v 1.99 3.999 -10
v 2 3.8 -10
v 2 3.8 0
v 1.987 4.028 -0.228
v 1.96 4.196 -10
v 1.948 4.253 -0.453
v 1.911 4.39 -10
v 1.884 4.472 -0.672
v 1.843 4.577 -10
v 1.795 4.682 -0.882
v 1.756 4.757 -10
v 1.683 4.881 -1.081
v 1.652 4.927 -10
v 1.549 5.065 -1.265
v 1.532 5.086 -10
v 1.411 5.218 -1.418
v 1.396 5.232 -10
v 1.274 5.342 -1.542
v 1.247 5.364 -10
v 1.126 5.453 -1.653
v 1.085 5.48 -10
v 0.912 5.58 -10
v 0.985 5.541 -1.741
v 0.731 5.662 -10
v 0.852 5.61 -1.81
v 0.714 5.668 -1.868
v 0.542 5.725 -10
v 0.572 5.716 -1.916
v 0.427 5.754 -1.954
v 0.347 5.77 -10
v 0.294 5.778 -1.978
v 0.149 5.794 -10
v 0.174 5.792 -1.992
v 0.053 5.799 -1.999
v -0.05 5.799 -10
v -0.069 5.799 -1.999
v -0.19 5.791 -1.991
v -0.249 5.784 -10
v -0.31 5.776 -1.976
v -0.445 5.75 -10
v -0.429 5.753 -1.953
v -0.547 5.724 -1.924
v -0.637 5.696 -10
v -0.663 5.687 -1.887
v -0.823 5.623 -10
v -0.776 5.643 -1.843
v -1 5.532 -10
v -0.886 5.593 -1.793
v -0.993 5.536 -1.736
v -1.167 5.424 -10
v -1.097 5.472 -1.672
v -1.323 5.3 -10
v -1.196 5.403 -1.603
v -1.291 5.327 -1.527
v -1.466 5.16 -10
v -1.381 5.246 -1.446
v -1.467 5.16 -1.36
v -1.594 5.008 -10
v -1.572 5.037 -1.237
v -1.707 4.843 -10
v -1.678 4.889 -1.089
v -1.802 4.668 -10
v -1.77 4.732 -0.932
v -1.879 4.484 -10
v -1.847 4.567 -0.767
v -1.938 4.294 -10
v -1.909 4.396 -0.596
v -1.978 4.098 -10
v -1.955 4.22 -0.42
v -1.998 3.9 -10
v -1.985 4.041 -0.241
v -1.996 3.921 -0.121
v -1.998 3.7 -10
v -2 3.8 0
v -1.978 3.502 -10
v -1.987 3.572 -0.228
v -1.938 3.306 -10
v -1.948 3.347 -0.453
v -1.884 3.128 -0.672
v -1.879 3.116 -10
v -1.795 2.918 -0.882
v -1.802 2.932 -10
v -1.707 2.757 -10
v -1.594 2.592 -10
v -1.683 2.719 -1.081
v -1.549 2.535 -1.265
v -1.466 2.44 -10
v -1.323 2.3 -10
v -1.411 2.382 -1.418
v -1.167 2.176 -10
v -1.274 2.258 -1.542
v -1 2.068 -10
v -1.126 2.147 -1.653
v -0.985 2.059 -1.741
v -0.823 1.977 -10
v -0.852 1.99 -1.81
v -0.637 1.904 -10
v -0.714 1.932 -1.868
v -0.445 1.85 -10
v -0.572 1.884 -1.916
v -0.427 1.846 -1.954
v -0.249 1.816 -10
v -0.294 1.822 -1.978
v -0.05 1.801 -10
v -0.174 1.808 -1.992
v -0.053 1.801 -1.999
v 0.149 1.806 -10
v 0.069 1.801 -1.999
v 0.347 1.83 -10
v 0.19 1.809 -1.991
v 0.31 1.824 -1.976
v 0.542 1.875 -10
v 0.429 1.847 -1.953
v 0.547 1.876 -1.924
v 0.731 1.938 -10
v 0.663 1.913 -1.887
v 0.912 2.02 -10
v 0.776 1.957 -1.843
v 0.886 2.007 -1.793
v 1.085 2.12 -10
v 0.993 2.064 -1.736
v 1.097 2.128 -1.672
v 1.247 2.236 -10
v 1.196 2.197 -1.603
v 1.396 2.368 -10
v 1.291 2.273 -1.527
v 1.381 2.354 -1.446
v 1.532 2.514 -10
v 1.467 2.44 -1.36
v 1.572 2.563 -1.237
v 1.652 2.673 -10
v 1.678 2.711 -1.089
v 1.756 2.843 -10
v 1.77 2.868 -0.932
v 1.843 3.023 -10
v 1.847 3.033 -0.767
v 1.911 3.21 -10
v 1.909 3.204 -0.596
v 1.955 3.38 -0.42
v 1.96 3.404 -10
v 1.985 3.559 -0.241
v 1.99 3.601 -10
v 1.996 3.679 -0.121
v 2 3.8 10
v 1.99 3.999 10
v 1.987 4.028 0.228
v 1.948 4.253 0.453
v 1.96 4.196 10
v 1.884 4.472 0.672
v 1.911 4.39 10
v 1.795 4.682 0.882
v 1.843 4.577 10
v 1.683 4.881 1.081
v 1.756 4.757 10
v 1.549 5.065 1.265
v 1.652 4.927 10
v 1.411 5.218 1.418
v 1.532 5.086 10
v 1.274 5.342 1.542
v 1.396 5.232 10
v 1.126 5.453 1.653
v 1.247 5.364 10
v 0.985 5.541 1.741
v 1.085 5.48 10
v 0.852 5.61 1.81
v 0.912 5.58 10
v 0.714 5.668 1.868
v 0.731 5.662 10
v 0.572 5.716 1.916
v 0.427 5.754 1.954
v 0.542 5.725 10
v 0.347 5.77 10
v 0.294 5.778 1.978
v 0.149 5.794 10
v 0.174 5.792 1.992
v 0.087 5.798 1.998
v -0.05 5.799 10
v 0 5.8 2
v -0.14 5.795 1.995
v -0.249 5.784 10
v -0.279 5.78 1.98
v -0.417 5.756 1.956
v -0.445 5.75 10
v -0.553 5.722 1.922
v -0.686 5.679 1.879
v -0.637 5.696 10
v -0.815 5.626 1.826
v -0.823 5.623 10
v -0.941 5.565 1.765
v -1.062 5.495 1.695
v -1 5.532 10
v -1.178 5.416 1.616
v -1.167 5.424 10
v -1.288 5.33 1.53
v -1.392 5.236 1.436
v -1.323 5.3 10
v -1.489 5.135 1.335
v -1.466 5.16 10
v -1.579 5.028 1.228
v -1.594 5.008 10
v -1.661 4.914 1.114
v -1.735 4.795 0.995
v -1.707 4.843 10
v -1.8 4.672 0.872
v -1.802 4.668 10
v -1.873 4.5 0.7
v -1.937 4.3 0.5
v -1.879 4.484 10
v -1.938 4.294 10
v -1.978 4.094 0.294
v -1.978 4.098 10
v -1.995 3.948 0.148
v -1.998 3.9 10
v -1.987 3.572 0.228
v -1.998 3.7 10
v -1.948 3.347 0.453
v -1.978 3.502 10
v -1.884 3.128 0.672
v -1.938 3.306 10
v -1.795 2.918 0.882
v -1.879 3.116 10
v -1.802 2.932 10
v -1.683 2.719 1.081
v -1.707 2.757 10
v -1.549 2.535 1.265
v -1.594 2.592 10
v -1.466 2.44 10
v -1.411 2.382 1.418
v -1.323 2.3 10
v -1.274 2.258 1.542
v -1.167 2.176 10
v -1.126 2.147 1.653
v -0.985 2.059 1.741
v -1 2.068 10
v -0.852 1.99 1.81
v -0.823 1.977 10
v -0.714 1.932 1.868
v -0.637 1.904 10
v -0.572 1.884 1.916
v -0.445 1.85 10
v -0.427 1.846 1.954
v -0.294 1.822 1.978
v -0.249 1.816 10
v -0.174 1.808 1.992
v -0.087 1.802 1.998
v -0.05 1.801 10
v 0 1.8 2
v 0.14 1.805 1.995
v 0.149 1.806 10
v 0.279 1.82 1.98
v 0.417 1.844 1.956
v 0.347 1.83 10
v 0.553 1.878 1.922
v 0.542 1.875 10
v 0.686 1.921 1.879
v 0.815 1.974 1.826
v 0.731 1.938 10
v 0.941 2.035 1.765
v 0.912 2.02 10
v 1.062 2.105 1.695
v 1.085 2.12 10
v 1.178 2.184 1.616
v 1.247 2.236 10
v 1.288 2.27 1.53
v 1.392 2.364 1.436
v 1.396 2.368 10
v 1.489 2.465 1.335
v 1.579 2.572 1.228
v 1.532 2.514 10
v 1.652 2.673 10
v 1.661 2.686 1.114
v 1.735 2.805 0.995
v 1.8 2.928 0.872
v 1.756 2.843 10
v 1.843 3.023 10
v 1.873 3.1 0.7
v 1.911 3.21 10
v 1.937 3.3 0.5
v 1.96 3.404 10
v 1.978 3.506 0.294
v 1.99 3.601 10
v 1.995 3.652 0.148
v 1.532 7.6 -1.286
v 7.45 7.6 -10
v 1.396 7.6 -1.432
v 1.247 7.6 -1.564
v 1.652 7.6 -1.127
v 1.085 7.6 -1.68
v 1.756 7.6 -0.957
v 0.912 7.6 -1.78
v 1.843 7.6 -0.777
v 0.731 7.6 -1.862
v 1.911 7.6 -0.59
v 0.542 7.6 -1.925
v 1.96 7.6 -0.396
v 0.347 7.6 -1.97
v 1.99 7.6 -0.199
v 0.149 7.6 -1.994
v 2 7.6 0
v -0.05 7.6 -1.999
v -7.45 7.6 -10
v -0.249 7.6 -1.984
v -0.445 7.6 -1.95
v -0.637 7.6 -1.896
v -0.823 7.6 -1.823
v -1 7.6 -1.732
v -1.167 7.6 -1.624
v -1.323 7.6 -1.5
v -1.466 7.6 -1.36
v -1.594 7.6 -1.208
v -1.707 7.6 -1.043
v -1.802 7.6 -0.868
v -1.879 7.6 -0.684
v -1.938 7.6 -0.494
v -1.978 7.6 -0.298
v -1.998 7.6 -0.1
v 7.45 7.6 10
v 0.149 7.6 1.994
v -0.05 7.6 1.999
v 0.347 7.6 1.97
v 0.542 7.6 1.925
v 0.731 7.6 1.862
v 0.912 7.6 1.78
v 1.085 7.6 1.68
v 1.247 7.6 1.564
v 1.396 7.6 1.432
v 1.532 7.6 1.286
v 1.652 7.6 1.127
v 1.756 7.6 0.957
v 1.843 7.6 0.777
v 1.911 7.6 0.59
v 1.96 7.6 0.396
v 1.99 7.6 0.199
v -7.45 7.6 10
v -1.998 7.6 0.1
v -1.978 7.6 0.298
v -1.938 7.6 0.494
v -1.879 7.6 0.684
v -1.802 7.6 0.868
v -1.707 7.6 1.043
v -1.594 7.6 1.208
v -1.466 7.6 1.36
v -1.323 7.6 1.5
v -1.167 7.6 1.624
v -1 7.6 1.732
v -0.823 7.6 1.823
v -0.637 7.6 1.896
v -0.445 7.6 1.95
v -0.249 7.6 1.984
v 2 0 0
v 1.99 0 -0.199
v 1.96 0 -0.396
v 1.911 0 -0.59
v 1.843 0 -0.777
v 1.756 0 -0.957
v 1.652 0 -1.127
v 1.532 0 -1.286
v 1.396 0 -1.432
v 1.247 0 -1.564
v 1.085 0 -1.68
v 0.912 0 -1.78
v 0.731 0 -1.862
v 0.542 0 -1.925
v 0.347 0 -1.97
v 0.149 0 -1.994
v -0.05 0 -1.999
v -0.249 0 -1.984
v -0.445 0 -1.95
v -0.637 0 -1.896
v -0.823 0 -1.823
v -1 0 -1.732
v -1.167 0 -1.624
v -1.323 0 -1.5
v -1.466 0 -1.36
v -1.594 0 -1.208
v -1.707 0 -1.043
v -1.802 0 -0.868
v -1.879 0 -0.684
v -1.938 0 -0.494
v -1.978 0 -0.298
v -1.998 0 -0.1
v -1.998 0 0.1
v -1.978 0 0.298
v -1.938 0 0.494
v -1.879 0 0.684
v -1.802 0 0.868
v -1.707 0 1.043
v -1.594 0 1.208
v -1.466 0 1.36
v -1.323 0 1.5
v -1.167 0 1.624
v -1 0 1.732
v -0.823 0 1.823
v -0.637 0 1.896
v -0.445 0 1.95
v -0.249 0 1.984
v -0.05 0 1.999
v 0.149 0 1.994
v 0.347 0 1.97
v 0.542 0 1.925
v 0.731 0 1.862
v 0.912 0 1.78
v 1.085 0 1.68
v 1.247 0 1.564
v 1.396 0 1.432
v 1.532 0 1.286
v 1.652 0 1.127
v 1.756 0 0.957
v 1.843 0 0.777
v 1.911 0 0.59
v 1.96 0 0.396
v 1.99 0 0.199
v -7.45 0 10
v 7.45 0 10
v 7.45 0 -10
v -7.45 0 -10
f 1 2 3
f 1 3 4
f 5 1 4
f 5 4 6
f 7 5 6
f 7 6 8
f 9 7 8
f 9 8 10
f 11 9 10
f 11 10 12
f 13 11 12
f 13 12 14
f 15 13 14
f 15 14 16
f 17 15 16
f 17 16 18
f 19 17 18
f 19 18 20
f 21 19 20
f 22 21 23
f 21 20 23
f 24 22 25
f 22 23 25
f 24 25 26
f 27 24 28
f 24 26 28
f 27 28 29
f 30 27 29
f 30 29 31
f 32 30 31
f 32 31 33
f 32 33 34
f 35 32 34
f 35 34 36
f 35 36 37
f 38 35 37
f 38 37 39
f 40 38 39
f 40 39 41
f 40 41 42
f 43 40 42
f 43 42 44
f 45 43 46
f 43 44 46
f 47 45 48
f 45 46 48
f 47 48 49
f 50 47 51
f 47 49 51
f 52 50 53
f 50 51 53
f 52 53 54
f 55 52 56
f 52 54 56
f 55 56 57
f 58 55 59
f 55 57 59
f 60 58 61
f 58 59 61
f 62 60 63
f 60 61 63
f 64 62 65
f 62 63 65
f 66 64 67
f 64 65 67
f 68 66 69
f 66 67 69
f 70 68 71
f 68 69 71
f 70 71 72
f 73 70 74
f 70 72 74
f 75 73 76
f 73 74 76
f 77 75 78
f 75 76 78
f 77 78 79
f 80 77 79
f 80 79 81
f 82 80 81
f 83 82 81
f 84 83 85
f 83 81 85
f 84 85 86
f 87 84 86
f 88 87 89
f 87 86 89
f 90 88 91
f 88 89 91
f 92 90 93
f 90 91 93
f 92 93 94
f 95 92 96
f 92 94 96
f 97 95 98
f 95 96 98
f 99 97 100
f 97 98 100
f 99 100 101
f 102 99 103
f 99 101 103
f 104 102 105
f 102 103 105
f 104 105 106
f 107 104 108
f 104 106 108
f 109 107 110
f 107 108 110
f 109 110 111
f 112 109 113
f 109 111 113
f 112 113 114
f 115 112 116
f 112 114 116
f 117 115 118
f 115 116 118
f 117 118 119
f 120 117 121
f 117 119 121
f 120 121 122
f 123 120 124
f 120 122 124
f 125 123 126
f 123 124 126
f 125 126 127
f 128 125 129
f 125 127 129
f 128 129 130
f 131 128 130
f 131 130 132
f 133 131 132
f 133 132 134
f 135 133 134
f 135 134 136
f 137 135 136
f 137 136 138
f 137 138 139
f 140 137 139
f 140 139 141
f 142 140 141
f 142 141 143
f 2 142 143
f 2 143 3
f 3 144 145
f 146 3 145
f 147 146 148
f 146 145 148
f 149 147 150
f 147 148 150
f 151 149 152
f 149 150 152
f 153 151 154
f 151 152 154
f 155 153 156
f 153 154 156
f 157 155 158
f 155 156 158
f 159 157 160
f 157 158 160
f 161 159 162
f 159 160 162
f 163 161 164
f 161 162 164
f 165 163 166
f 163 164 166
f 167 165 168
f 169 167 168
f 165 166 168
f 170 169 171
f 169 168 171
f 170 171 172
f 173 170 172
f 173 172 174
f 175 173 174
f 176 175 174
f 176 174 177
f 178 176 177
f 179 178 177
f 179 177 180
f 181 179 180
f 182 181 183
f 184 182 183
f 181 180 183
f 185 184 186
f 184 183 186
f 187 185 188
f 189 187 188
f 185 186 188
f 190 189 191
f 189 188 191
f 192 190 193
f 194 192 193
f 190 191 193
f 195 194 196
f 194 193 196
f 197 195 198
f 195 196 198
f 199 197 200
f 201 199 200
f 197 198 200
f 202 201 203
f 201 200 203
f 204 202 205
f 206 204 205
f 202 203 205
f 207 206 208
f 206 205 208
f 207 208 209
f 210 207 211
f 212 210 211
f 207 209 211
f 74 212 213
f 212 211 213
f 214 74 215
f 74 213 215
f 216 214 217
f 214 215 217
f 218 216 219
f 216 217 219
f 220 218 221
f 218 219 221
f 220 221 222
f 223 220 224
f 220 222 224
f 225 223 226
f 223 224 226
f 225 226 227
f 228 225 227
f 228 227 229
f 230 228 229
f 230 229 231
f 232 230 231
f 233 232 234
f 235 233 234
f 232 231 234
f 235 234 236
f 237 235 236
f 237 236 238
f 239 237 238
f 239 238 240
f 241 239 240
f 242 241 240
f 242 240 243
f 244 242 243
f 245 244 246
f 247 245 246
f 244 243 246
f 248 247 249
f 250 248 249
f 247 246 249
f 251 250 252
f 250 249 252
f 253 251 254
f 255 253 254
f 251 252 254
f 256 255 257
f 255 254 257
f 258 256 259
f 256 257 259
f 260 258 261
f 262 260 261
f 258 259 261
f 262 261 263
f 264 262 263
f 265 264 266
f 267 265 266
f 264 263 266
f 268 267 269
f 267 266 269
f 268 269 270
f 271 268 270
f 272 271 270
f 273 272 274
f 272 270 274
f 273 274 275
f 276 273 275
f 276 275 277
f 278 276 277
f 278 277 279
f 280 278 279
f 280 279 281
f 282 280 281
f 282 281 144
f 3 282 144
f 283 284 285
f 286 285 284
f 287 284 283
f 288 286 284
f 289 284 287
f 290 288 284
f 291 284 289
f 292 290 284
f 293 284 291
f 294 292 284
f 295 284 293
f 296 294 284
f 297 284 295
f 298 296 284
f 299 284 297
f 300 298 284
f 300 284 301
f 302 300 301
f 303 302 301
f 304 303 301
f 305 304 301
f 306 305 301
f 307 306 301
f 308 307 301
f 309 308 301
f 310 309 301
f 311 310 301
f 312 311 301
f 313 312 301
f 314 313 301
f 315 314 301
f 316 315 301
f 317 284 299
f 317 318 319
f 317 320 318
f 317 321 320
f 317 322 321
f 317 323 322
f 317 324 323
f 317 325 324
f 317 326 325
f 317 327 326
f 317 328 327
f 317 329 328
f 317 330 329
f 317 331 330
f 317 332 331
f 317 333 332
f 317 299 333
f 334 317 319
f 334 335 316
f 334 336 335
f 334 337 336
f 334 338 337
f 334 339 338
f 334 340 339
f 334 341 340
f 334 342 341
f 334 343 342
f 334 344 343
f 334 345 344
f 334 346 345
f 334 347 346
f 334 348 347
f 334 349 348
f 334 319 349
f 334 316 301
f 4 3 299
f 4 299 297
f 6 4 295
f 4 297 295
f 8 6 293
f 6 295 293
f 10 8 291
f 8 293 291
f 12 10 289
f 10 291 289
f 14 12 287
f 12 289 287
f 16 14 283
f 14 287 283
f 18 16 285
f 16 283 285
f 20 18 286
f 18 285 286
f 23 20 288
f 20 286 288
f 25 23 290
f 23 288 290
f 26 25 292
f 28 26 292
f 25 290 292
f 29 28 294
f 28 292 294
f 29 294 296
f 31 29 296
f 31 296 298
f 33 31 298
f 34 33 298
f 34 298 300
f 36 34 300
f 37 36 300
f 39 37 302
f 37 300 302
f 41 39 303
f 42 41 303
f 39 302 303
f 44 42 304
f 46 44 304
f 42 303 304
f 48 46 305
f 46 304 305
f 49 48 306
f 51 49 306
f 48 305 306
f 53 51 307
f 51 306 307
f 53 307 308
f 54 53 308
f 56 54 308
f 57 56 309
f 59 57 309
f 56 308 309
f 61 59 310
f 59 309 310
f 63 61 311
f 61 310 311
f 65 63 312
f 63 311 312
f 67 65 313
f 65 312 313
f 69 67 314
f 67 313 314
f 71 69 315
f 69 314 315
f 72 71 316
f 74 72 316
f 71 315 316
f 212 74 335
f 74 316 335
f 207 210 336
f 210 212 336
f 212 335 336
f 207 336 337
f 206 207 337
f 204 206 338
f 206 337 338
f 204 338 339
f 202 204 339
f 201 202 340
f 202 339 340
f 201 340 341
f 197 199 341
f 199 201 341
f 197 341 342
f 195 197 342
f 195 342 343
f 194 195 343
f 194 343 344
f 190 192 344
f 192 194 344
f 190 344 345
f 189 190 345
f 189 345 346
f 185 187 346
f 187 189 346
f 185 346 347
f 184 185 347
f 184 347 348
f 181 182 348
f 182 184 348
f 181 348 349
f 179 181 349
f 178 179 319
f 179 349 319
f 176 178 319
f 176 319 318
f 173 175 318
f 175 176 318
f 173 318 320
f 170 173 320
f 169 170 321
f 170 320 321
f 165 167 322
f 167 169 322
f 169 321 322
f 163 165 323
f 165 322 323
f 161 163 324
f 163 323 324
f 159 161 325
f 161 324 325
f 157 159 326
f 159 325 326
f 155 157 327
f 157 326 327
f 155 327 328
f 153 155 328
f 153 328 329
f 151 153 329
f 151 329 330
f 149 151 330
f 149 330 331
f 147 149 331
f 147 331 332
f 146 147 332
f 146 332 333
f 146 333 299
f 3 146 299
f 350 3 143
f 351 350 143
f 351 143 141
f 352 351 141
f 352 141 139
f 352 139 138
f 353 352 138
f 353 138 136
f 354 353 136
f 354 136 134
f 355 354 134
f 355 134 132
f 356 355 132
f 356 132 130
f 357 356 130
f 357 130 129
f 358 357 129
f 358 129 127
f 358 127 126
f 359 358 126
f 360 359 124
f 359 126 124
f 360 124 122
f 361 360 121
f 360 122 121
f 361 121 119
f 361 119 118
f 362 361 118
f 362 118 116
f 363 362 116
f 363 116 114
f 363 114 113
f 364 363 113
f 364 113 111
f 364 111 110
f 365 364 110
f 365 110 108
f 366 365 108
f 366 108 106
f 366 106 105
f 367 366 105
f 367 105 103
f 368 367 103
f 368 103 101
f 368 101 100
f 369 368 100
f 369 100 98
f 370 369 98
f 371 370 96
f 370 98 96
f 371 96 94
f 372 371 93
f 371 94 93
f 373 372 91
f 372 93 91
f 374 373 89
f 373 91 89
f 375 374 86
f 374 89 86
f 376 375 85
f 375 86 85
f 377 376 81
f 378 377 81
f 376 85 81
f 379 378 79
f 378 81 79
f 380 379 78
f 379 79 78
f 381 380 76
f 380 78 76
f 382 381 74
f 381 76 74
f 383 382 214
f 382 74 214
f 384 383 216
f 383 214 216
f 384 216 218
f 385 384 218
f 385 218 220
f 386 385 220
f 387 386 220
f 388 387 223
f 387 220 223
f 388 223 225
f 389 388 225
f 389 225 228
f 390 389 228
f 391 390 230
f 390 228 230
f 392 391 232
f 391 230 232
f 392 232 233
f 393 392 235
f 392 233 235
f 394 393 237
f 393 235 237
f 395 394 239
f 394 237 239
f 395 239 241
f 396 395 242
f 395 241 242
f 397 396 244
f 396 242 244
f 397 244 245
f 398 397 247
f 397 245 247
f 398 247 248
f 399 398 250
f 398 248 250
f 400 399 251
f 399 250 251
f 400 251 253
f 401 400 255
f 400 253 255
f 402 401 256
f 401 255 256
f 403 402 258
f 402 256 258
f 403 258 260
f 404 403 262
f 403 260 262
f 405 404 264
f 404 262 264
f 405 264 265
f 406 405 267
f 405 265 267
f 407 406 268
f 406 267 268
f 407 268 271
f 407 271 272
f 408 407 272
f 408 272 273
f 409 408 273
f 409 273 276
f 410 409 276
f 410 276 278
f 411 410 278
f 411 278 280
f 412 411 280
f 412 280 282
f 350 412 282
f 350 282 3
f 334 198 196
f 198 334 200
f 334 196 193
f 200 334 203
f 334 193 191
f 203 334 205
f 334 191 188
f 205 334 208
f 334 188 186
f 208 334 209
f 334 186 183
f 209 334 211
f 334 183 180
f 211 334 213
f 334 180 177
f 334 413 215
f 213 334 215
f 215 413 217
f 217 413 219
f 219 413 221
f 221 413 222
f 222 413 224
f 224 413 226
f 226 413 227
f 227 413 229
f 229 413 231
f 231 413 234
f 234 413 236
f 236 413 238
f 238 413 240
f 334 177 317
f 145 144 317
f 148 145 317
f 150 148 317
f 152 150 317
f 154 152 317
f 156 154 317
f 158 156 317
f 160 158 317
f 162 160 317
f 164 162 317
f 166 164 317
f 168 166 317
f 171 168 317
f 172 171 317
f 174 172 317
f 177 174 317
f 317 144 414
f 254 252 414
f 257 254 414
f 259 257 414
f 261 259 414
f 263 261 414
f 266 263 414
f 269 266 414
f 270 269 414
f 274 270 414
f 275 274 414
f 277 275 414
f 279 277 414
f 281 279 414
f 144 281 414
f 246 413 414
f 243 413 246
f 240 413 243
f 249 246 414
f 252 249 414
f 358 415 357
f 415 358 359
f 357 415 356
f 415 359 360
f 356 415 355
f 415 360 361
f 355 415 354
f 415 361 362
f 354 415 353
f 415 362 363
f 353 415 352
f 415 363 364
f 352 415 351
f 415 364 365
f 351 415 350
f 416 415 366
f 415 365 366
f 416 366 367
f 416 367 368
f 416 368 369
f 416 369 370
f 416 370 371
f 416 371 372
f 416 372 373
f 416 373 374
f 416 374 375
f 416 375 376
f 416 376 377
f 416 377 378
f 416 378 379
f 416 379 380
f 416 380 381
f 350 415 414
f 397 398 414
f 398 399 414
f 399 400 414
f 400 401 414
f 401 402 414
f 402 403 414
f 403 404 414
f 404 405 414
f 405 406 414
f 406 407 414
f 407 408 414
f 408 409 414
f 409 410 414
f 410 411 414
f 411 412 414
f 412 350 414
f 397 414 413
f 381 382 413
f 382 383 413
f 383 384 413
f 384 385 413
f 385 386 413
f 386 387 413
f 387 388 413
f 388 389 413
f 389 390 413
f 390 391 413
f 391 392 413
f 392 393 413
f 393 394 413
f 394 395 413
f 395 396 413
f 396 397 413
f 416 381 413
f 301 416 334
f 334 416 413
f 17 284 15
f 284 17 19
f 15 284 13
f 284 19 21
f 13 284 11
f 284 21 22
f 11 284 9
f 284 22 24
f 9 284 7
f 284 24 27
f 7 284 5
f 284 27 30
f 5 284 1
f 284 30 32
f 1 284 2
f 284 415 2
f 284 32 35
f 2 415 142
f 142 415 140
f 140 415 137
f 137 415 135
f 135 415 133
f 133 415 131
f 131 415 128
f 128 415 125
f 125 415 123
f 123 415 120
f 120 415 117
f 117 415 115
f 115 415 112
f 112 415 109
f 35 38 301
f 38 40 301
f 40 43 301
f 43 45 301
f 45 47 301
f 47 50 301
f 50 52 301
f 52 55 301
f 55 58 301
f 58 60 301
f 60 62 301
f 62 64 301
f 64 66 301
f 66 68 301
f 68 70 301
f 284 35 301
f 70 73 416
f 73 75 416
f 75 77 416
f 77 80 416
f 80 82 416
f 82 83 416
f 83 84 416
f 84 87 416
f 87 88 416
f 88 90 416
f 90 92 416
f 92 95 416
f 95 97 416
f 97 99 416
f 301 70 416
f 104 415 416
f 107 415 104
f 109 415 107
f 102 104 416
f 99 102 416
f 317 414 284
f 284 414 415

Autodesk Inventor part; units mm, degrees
ref_plane "YZ Plane" through (0, 0, 0) normal (1, 0, 0) x (0, 1, 0)
ref_plane "XZ Plane" through (0, 0, 0) normal (0, 1, 0) x (-1, 0, 0)
ref_plane "XY Plane" through (0, 0, 0) normal (0, 0, 1) x (1, 0, 0)
sketch "Sketch1" plane through (0, 0, 0) normal (0, 1, 0) x (-1, 0, 0)
  line L0 (-7.45, 10) -> (-7.45, -10)
  line L1 (-7.45, -10) -> (7.45, -10)
  line L2 (7.45, -10) -> (7.45, 10)
  line L3 (7.45, 10) -> (-7.45, 10)
  line L4 (-7.45, 10) -> (7.45, -10) construction
  line L5 (-7.45, -10) -> (7.45, 10) construction
  point P0 (0, 0)
  dimension "d0" = 14.9
  dimension "d1" = 20
extrude "Extrusion1" add sketch "Sketch1" along normal blind 7.6
sketch "Sketch2" plane through (-7.45, 0, 10) normal (0, 0, 1) x (1, 0, 0)
  line L0 (14.9, 0) -> (0, 0) projected
  line L1 (14.9, 7.6) -> (0, 7.6) projected
  line L2 (0, 0) -> (14.9, 7.6) construction
  line L3 (0, 7.6) -> (14.9, 0) construction
  circle A0 centre (7.45, 3.8) radius 2
  point P0 (7.45, 0)
  dimension "d4" = 4
extrude "Extrusion2" cut sketch "Sketch2" against normal through all
sketch "Sketch3" plane through (0, 7.6, 0) normal (0, 1, 0) x (1, 0, 0)
  circle A0 centre (0, 0) radius 2
  dimension "d7" = 4
extrude "Extrusion3" cut sketch "Sketch3" against normal through all
properties part number "MM3_track"
